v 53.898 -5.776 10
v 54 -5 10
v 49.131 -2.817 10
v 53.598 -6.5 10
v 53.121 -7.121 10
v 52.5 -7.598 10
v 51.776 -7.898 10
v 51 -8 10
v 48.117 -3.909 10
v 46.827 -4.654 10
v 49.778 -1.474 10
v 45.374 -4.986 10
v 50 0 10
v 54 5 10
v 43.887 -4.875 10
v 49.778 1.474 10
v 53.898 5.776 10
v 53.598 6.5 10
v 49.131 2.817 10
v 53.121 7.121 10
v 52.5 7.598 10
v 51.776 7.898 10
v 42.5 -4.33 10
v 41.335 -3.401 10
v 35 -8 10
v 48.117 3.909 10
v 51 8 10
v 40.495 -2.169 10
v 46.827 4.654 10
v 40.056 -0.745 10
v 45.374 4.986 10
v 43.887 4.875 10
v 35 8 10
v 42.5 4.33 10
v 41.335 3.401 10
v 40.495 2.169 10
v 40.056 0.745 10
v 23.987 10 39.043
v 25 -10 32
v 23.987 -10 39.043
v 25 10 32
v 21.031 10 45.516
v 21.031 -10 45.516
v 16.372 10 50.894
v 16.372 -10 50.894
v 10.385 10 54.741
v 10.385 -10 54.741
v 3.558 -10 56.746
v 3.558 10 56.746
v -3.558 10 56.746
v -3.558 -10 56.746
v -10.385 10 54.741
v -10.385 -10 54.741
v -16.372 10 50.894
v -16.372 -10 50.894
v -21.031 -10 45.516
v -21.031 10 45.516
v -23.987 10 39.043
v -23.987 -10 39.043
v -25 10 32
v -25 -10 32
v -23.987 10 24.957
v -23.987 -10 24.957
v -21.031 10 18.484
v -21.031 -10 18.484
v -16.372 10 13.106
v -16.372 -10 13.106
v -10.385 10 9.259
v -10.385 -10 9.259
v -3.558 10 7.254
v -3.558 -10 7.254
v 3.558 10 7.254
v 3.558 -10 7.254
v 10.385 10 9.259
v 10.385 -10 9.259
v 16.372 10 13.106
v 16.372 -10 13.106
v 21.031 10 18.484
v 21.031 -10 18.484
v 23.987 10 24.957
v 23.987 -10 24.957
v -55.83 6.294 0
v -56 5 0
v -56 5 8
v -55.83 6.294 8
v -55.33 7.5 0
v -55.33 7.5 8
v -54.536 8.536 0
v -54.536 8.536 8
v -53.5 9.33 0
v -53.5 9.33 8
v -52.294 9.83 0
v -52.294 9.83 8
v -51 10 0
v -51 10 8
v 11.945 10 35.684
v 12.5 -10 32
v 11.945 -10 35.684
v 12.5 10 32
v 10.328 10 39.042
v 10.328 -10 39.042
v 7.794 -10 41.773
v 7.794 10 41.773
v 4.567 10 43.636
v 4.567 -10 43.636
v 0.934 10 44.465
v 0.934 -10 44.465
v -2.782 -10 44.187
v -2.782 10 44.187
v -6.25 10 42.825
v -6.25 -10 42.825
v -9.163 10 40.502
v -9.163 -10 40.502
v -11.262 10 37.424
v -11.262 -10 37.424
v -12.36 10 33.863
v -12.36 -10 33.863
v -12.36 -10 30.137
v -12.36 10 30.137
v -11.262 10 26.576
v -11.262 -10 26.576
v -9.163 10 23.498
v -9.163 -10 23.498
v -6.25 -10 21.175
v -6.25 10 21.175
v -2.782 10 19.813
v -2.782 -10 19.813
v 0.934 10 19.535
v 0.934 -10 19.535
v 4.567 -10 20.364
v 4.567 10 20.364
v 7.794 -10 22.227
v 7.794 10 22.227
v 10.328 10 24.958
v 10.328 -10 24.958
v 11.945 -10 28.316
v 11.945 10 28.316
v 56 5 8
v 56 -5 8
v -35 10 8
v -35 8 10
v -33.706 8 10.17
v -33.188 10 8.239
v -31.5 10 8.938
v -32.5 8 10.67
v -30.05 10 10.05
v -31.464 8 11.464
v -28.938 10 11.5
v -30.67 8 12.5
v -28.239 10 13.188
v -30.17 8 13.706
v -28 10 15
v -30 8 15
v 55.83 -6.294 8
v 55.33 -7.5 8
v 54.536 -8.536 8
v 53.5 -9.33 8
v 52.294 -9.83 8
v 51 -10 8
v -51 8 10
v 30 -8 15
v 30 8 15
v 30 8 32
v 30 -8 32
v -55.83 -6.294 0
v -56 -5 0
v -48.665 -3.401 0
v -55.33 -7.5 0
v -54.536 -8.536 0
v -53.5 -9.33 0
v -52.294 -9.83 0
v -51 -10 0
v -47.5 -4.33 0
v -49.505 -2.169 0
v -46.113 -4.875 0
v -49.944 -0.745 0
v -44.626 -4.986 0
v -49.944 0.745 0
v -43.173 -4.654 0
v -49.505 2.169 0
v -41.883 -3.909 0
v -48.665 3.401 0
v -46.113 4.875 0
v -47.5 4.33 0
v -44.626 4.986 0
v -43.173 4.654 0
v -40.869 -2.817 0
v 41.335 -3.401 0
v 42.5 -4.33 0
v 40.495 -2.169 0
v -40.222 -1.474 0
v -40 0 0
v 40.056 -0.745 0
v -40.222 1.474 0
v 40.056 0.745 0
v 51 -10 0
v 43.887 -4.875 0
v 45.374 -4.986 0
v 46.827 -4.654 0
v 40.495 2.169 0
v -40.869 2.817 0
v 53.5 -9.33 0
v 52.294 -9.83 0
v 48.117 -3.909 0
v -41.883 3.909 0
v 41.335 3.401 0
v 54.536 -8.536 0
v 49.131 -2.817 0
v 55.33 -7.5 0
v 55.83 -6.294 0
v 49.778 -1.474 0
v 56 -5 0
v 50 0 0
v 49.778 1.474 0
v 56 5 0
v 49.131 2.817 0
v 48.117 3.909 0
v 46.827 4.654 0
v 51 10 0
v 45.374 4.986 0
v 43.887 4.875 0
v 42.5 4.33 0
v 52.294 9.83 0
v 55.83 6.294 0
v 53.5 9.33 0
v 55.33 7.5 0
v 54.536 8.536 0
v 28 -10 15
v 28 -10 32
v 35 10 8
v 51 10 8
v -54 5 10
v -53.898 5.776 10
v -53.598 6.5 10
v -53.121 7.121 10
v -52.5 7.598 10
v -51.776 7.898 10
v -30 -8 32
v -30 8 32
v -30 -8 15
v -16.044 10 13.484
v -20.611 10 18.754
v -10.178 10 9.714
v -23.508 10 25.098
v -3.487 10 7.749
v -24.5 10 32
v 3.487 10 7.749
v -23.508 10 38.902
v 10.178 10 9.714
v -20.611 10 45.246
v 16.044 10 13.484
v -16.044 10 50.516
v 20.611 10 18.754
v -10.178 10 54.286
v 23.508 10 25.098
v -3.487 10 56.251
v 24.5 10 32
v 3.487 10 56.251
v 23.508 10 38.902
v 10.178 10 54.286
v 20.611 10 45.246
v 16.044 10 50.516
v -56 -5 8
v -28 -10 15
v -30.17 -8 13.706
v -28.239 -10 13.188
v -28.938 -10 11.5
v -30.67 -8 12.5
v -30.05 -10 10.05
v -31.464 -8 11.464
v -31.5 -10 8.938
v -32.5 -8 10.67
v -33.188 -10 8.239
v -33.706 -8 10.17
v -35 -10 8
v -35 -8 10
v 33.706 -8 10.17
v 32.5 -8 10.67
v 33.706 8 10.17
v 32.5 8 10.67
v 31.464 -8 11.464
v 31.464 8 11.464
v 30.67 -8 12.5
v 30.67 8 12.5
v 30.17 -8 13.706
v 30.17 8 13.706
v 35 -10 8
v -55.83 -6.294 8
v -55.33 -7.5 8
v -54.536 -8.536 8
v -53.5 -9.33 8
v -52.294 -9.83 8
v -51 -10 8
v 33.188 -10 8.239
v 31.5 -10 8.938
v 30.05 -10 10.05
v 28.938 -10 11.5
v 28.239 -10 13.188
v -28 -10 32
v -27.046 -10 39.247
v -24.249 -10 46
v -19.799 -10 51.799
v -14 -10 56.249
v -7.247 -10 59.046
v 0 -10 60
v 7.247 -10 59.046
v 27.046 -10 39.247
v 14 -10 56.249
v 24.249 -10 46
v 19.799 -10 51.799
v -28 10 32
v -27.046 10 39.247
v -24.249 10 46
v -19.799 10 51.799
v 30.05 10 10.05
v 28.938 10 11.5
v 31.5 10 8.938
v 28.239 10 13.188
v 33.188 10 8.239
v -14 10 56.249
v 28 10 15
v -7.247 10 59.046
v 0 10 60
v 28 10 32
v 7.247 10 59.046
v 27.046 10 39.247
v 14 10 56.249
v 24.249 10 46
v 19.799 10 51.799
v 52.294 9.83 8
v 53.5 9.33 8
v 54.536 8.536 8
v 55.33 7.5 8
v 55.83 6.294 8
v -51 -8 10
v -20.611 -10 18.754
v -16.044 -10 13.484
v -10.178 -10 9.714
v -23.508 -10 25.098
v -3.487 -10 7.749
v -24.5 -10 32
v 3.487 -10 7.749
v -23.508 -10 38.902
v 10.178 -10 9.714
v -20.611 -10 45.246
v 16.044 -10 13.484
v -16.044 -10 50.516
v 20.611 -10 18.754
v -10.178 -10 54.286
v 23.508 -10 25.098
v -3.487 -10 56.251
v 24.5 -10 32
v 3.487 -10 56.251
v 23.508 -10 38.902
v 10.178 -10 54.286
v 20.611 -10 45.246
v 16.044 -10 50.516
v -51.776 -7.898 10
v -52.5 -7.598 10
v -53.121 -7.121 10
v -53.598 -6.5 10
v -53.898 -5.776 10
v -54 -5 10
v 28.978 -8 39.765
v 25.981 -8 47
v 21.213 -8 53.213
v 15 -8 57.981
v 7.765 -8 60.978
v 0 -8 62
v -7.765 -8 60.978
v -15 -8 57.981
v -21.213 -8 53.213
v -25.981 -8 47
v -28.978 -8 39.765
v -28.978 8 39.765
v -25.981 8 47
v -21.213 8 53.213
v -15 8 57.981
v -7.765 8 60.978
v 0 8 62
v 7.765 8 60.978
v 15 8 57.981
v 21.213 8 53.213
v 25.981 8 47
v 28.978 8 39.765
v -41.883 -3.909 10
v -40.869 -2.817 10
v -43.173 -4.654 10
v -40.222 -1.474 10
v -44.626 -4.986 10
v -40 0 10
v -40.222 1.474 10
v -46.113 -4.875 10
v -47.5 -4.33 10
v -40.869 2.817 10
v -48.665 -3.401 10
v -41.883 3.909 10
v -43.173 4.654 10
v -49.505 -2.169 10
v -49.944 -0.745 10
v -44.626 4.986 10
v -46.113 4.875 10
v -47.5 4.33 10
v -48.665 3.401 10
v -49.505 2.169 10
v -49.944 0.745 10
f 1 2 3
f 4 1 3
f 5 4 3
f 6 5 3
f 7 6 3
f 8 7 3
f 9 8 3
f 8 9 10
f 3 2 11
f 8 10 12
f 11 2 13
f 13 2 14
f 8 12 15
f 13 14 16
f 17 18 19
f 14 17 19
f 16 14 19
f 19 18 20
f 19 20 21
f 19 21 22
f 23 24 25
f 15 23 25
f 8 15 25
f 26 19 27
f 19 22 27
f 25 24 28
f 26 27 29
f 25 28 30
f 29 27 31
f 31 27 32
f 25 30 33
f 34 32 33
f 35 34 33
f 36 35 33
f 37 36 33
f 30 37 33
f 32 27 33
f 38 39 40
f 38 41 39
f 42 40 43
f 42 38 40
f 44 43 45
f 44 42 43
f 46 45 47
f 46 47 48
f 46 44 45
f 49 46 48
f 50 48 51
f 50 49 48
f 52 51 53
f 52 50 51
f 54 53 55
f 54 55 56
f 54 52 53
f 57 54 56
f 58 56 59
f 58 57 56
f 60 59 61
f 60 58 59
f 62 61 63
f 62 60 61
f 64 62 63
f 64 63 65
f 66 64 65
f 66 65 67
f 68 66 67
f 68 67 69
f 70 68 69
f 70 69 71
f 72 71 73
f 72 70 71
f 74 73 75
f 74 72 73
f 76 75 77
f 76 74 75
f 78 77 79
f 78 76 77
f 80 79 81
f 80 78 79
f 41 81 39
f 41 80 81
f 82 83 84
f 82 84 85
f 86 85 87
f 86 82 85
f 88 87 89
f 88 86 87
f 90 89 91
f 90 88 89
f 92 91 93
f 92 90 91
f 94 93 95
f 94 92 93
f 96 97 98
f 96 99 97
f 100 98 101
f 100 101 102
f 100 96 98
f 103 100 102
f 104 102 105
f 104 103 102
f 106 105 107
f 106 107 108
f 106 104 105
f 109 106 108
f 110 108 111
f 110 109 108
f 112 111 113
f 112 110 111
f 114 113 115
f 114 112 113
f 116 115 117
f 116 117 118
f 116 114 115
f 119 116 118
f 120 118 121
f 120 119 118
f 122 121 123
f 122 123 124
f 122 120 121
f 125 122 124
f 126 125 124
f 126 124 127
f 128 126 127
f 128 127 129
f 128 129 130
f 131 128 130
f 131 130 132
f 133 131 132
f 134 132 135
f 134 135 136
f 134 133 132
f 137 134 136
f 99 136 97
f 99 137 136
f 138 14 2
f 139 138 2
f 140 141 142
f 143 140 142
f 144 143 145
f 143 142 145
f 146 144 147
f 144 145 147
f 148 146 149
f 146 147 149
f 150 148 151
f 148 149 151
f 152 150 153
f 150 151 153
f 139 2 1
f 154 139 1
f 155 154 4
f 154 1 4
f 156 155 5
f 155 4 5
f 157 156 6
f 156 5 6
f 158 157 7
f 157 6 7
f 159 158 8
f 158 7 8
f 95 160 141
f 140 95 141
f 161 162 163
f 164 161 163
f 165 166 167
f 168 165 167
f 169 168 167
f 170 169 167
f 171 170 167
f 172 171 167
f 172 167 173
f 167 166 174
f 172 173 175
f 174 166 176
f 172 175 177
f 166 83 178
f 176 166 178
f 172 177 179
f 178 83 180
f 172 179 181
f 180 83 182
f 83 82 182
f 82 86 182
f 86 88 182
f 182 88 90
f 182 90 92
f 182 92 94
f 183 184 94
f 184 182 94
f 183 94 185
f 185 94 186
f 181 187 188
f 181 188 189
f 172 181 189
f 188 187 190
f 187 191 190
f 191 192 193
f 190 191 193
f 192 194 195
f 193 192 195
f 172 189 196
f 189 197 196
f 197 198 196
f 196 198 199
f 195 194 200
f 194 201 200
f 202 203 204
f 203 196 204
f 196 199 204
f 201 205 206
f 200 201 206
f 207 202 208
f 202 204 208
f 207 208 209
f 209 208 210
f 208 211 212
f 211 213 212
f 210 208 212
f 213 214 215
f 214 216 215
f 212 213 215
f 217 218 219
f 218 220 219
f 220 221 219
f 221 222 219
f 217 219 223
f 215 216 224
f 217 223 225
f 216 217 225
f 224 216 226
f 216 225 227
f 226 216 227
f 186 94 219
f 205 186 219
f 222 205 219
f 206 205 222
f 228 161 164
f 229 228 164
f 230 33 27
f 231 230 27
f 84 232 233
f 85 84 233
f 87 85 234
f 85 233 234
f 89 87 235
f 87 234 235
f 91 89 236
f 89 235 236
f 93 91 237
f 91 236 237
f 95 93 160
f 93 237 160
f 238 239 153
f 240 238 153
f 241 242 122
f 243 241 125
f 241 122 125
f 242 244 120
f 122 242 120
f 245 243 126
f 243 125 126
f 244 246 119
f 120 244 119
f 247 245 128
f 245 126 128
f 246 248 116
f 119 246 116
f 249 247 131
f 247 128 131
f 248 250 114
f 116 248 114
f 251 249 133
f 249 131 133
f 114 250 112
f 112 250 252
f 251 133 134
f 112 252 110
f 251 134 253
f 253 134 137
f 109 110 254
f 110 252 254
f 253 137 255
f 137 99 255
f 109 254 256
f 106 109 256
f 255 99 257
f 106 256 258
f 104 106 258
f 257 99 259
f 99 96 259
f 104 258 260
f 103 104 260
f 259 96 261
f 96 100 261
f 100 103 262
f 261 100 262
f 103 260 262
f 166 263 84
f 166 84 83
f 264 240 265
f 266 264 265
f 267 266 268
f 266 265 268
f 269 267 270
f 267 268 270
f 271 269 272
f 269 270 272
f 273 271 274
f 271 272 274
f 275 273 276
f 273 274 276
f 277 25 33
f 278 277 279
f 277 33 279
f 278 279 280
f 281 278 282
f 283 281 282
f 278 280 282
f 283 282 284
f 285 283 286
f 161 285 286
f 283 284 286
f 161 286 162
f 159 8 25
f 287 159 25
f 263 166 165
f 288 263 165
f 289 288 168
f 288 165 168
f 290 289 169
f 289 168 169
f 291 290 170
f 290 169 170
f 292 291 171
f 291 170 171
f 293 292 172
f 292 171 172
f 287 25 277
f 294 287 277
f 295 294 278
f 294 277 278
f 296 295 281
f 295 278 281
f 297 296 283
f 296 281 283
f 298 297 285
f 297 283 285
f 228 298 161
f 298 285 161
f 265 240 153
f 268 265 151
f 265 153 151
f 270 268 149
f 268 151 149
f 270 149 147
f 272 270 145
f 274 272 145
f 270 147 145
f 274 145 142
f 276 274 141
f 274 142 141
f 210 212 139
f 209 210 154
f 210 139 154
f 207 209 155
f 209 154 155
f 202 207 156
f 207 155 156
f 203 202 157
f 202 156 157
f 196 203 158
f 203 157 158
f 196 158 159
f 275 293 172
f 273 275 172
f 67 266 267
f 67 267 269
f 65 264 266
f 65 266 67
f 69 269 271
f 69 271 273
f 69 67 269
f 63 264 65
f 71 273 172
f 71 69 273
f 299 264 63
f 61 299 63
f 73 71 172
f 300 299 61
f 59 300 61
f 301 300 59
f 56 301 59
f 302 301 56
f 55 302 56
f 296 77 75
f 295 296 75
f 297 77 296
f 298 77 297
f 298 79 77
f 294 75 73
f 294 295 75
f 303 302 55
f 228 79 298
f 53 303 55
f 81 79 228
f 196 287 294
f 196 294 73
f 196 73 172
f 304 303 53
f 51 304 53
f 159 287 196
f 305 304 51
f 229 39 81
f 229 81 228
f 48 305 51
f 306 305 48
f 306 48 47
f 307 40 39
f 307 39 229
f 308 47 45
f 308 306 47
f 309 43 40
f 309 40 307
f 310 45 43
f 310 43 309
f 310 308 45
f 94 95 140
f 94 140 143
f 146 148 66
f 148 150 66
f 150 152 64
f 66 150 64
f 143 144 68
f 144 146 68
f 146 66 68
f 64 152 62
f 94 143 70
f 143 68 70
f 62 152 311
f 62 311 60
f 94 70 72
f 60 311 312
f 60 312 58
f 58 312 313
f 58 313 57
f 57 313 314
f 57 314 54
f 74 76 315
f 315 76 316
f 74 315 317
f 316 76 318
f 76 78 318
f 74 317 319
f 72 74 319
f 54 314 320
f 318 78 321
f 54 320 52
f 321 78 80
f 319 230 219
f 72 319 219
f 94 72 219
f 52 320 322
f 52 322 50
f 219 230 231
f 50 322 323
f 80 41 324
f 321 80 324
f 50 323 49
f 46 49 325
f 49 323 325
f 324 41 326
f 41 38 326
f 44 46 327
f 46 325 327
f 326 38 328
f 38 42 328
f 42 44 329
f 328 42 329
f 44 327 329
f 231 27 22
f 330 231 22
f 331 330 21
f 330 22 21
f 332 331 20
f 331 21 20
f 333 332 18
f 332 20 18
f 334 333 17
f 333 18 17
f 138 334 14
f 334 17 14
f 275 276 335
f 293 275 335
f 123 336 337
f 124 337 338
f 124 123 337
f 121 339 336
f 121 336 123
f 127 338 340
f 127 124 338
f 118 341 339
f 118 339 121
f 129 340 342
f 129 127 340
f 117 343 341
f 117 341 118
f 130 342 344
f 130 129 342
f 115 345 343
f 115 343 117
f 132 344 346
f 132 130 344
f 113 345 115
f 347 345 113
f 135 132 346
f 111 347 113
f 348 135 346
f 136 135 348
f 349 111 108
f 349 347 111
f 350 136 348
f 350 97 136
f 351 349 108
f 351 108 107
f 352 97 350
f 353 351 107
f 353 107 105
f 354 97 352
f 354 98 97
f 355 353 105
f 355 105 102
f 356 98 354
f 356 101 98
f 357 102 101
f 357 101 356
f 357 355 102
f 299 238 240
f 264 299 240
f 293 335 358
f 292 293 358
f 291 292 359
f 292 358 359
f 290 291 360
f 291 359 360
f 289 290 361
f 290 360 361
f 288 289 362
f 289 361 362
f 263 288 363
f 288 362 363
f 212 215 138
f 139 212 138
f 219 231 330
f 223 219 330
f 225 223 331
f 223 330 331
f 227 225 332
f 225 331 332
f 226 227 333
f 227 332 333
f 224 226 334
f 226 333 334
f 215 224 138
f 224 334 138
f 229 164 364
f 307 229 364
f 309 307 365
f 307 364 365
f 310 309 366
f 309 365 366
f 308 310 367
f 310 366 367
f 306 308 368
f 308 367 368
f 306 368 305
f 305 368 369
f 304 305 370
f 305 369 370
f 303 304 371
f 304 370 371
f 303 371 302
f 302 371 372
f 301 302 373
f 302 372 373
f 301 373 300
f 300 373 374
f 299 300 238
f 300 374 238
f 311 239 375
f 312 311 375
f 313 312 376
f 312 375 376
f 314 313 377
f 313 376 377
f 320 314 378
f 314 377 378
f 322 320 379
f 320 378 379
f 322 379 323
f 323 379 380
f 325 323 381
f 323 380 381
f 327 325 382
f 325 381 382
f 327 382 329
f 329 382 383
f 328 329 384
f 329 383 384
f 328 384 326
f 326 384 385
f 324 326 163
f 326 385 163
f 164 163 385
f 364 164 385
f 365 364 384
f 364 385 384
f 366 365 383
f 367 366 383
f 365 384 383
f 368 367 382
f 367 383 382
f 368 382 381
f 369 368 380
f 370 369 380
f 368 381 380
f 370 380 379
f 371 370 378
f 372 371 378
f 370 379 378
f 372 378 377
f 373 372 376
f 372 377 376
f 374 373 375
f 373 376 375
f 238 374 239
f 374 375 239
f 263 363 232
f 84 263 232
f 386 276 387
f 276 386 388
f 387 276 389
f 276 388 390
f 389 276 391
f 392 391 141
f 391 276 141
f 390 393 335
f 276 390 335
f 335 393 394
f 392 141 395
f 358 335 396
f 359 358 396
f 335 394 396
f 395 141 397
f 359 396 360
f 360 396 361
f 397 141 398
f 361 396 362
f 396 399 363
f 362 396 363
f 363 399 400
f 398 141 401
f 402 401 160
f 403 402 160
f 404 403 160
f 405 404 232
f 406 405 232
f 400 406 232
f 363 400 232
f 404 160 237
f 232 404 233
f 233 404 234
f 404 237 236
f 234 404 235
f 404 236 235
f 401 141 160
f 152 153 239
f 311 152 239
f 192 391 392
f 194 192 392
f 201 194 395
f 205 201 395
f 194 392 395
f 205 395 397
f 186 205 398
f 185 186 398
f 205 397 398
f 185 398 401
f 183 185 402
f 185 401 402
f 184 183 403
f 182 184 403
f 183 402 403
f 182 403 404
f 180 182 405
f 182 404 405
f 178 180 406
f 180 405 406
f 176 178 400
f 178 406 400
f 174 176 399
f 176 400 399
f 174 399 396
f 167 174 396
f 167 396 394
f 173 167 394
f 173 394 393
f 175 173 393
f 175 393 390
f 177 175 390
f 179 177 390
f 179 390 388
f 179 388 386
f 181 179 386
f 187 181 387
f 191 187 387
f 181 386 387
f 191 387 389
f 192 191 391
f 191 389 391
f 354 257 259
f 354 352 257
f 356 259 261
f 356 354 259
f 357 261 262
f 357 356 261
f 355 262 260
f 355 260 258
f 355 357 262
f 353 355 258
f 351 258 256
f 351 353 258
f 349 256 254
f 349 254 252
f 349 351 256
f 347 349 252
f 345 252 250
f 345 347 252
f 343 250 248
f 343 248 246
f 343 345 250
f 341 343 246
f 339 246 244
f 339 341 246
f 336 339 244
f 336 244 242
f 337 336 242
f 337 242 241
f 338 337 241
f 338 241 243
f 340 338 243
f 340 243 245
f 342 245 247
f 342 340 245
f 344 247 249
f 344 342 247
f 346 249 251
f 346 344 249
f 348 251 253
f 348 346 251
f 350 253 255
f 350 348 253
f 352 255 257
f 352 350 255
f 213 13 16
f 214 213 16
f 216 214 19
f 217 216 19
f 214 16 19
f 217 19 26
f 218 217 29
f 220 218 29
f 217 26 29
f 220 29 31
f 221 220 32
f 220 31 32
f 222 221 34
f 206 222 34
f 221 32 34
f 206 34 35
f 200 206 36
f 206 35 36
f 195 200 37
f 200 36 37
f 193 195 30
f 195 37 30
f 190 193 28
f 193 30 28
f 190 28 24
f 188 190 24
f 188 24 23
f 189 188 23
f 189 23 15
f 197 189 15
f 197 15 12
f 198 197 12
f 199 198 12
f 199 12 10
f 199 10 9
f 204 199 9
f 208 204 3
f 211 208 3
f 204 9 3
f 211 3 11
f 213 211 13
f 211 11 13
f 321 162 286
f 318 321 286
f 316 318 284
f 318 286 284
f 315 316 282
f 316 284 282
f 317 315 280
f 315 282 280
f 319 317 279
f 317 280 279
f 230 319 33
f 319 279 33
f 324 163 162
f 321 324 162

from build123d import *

# Parameters (mm, degrees)
F0_R     = 25
F0_R_2   = 24.5
F0_R_3   = 12.5
F1_DEPTH = 10
F2_R     = 5
F3_R     = 5
F4_DEPTH = 10
F5_SIZE  = 2


with BuildPart() as f1:
    # F0 (on Front) → F1 (new body, symmetric)
    with BuildSketch(Plane.XZ):
        with BuildLine():
            Line((-56, 10), (-56, 0))
            Line((-56, 0), (56, 0))
            Line((56, 0), (56, 10))
            Line((56, 10), (35, 10))
            ThreePointArc((35, 10), (31.464466, 11.464466), (30, 15))
            Line((30, 15), (30, 32))
            ThreePointArc((30, 32), (0, 2), (-30, 32))
            Line((-30, 32), (-30, 15))
            ThreePointArc((-30, 15), (-31.464466, 11.464466), (-35, 10))
            Line((-35, 10), (-56, 10))
        make_face()
        with BuildLine():
            ThreePointArc((30, 32), (0, 62), (-30, 32))
            ThreePointArc((-30, 32), (0, 2), (30, 32))
        make_face()
        with Locations((0, 32)):
            Circle(F0_R, mode=Mode.SUBTRACT)
        with Locations((0, 32)):
            Circle(F0_R_2)
        with Locations((0, 32)):
            Circle(F0_R_3, mode=Mode.SUBTRACT)
    extrude(amount=F1_DEPTH, both=True)

    # F2
    f2_edges = [f1.edges().sort_by_distance(p)[0] for p in [
        (-56, -10, 5),
        (56, -10, 5),
        (56, 10, 5),
        (-56, 10, 5),
    ]]
    fillet(f2_edges, radius=F2_R)

    # F3 (on face) → F4 (cut)
    with BuildSketch(Plane.XY.offset(10)):
        with Locations((-45, 0)):
            Circle(F3_R)
        with Locations((45, 0)):
            Circle(F3_R)
    extrude(amount=-F4_DEPTH, mode=Mode.SUBTRACT)

    # F5
    f5_edges = [f1.edges().sort_by_distance(p)[0] for p in [
        (-30, -10, 23.5),
        (30, -10, 23.5),
        (30, 10, 23.5),
        (-30, 10, 23.5),
    ]]
    chamfer(f5_edges, length=F5_SIZE)


solid = f1.part
